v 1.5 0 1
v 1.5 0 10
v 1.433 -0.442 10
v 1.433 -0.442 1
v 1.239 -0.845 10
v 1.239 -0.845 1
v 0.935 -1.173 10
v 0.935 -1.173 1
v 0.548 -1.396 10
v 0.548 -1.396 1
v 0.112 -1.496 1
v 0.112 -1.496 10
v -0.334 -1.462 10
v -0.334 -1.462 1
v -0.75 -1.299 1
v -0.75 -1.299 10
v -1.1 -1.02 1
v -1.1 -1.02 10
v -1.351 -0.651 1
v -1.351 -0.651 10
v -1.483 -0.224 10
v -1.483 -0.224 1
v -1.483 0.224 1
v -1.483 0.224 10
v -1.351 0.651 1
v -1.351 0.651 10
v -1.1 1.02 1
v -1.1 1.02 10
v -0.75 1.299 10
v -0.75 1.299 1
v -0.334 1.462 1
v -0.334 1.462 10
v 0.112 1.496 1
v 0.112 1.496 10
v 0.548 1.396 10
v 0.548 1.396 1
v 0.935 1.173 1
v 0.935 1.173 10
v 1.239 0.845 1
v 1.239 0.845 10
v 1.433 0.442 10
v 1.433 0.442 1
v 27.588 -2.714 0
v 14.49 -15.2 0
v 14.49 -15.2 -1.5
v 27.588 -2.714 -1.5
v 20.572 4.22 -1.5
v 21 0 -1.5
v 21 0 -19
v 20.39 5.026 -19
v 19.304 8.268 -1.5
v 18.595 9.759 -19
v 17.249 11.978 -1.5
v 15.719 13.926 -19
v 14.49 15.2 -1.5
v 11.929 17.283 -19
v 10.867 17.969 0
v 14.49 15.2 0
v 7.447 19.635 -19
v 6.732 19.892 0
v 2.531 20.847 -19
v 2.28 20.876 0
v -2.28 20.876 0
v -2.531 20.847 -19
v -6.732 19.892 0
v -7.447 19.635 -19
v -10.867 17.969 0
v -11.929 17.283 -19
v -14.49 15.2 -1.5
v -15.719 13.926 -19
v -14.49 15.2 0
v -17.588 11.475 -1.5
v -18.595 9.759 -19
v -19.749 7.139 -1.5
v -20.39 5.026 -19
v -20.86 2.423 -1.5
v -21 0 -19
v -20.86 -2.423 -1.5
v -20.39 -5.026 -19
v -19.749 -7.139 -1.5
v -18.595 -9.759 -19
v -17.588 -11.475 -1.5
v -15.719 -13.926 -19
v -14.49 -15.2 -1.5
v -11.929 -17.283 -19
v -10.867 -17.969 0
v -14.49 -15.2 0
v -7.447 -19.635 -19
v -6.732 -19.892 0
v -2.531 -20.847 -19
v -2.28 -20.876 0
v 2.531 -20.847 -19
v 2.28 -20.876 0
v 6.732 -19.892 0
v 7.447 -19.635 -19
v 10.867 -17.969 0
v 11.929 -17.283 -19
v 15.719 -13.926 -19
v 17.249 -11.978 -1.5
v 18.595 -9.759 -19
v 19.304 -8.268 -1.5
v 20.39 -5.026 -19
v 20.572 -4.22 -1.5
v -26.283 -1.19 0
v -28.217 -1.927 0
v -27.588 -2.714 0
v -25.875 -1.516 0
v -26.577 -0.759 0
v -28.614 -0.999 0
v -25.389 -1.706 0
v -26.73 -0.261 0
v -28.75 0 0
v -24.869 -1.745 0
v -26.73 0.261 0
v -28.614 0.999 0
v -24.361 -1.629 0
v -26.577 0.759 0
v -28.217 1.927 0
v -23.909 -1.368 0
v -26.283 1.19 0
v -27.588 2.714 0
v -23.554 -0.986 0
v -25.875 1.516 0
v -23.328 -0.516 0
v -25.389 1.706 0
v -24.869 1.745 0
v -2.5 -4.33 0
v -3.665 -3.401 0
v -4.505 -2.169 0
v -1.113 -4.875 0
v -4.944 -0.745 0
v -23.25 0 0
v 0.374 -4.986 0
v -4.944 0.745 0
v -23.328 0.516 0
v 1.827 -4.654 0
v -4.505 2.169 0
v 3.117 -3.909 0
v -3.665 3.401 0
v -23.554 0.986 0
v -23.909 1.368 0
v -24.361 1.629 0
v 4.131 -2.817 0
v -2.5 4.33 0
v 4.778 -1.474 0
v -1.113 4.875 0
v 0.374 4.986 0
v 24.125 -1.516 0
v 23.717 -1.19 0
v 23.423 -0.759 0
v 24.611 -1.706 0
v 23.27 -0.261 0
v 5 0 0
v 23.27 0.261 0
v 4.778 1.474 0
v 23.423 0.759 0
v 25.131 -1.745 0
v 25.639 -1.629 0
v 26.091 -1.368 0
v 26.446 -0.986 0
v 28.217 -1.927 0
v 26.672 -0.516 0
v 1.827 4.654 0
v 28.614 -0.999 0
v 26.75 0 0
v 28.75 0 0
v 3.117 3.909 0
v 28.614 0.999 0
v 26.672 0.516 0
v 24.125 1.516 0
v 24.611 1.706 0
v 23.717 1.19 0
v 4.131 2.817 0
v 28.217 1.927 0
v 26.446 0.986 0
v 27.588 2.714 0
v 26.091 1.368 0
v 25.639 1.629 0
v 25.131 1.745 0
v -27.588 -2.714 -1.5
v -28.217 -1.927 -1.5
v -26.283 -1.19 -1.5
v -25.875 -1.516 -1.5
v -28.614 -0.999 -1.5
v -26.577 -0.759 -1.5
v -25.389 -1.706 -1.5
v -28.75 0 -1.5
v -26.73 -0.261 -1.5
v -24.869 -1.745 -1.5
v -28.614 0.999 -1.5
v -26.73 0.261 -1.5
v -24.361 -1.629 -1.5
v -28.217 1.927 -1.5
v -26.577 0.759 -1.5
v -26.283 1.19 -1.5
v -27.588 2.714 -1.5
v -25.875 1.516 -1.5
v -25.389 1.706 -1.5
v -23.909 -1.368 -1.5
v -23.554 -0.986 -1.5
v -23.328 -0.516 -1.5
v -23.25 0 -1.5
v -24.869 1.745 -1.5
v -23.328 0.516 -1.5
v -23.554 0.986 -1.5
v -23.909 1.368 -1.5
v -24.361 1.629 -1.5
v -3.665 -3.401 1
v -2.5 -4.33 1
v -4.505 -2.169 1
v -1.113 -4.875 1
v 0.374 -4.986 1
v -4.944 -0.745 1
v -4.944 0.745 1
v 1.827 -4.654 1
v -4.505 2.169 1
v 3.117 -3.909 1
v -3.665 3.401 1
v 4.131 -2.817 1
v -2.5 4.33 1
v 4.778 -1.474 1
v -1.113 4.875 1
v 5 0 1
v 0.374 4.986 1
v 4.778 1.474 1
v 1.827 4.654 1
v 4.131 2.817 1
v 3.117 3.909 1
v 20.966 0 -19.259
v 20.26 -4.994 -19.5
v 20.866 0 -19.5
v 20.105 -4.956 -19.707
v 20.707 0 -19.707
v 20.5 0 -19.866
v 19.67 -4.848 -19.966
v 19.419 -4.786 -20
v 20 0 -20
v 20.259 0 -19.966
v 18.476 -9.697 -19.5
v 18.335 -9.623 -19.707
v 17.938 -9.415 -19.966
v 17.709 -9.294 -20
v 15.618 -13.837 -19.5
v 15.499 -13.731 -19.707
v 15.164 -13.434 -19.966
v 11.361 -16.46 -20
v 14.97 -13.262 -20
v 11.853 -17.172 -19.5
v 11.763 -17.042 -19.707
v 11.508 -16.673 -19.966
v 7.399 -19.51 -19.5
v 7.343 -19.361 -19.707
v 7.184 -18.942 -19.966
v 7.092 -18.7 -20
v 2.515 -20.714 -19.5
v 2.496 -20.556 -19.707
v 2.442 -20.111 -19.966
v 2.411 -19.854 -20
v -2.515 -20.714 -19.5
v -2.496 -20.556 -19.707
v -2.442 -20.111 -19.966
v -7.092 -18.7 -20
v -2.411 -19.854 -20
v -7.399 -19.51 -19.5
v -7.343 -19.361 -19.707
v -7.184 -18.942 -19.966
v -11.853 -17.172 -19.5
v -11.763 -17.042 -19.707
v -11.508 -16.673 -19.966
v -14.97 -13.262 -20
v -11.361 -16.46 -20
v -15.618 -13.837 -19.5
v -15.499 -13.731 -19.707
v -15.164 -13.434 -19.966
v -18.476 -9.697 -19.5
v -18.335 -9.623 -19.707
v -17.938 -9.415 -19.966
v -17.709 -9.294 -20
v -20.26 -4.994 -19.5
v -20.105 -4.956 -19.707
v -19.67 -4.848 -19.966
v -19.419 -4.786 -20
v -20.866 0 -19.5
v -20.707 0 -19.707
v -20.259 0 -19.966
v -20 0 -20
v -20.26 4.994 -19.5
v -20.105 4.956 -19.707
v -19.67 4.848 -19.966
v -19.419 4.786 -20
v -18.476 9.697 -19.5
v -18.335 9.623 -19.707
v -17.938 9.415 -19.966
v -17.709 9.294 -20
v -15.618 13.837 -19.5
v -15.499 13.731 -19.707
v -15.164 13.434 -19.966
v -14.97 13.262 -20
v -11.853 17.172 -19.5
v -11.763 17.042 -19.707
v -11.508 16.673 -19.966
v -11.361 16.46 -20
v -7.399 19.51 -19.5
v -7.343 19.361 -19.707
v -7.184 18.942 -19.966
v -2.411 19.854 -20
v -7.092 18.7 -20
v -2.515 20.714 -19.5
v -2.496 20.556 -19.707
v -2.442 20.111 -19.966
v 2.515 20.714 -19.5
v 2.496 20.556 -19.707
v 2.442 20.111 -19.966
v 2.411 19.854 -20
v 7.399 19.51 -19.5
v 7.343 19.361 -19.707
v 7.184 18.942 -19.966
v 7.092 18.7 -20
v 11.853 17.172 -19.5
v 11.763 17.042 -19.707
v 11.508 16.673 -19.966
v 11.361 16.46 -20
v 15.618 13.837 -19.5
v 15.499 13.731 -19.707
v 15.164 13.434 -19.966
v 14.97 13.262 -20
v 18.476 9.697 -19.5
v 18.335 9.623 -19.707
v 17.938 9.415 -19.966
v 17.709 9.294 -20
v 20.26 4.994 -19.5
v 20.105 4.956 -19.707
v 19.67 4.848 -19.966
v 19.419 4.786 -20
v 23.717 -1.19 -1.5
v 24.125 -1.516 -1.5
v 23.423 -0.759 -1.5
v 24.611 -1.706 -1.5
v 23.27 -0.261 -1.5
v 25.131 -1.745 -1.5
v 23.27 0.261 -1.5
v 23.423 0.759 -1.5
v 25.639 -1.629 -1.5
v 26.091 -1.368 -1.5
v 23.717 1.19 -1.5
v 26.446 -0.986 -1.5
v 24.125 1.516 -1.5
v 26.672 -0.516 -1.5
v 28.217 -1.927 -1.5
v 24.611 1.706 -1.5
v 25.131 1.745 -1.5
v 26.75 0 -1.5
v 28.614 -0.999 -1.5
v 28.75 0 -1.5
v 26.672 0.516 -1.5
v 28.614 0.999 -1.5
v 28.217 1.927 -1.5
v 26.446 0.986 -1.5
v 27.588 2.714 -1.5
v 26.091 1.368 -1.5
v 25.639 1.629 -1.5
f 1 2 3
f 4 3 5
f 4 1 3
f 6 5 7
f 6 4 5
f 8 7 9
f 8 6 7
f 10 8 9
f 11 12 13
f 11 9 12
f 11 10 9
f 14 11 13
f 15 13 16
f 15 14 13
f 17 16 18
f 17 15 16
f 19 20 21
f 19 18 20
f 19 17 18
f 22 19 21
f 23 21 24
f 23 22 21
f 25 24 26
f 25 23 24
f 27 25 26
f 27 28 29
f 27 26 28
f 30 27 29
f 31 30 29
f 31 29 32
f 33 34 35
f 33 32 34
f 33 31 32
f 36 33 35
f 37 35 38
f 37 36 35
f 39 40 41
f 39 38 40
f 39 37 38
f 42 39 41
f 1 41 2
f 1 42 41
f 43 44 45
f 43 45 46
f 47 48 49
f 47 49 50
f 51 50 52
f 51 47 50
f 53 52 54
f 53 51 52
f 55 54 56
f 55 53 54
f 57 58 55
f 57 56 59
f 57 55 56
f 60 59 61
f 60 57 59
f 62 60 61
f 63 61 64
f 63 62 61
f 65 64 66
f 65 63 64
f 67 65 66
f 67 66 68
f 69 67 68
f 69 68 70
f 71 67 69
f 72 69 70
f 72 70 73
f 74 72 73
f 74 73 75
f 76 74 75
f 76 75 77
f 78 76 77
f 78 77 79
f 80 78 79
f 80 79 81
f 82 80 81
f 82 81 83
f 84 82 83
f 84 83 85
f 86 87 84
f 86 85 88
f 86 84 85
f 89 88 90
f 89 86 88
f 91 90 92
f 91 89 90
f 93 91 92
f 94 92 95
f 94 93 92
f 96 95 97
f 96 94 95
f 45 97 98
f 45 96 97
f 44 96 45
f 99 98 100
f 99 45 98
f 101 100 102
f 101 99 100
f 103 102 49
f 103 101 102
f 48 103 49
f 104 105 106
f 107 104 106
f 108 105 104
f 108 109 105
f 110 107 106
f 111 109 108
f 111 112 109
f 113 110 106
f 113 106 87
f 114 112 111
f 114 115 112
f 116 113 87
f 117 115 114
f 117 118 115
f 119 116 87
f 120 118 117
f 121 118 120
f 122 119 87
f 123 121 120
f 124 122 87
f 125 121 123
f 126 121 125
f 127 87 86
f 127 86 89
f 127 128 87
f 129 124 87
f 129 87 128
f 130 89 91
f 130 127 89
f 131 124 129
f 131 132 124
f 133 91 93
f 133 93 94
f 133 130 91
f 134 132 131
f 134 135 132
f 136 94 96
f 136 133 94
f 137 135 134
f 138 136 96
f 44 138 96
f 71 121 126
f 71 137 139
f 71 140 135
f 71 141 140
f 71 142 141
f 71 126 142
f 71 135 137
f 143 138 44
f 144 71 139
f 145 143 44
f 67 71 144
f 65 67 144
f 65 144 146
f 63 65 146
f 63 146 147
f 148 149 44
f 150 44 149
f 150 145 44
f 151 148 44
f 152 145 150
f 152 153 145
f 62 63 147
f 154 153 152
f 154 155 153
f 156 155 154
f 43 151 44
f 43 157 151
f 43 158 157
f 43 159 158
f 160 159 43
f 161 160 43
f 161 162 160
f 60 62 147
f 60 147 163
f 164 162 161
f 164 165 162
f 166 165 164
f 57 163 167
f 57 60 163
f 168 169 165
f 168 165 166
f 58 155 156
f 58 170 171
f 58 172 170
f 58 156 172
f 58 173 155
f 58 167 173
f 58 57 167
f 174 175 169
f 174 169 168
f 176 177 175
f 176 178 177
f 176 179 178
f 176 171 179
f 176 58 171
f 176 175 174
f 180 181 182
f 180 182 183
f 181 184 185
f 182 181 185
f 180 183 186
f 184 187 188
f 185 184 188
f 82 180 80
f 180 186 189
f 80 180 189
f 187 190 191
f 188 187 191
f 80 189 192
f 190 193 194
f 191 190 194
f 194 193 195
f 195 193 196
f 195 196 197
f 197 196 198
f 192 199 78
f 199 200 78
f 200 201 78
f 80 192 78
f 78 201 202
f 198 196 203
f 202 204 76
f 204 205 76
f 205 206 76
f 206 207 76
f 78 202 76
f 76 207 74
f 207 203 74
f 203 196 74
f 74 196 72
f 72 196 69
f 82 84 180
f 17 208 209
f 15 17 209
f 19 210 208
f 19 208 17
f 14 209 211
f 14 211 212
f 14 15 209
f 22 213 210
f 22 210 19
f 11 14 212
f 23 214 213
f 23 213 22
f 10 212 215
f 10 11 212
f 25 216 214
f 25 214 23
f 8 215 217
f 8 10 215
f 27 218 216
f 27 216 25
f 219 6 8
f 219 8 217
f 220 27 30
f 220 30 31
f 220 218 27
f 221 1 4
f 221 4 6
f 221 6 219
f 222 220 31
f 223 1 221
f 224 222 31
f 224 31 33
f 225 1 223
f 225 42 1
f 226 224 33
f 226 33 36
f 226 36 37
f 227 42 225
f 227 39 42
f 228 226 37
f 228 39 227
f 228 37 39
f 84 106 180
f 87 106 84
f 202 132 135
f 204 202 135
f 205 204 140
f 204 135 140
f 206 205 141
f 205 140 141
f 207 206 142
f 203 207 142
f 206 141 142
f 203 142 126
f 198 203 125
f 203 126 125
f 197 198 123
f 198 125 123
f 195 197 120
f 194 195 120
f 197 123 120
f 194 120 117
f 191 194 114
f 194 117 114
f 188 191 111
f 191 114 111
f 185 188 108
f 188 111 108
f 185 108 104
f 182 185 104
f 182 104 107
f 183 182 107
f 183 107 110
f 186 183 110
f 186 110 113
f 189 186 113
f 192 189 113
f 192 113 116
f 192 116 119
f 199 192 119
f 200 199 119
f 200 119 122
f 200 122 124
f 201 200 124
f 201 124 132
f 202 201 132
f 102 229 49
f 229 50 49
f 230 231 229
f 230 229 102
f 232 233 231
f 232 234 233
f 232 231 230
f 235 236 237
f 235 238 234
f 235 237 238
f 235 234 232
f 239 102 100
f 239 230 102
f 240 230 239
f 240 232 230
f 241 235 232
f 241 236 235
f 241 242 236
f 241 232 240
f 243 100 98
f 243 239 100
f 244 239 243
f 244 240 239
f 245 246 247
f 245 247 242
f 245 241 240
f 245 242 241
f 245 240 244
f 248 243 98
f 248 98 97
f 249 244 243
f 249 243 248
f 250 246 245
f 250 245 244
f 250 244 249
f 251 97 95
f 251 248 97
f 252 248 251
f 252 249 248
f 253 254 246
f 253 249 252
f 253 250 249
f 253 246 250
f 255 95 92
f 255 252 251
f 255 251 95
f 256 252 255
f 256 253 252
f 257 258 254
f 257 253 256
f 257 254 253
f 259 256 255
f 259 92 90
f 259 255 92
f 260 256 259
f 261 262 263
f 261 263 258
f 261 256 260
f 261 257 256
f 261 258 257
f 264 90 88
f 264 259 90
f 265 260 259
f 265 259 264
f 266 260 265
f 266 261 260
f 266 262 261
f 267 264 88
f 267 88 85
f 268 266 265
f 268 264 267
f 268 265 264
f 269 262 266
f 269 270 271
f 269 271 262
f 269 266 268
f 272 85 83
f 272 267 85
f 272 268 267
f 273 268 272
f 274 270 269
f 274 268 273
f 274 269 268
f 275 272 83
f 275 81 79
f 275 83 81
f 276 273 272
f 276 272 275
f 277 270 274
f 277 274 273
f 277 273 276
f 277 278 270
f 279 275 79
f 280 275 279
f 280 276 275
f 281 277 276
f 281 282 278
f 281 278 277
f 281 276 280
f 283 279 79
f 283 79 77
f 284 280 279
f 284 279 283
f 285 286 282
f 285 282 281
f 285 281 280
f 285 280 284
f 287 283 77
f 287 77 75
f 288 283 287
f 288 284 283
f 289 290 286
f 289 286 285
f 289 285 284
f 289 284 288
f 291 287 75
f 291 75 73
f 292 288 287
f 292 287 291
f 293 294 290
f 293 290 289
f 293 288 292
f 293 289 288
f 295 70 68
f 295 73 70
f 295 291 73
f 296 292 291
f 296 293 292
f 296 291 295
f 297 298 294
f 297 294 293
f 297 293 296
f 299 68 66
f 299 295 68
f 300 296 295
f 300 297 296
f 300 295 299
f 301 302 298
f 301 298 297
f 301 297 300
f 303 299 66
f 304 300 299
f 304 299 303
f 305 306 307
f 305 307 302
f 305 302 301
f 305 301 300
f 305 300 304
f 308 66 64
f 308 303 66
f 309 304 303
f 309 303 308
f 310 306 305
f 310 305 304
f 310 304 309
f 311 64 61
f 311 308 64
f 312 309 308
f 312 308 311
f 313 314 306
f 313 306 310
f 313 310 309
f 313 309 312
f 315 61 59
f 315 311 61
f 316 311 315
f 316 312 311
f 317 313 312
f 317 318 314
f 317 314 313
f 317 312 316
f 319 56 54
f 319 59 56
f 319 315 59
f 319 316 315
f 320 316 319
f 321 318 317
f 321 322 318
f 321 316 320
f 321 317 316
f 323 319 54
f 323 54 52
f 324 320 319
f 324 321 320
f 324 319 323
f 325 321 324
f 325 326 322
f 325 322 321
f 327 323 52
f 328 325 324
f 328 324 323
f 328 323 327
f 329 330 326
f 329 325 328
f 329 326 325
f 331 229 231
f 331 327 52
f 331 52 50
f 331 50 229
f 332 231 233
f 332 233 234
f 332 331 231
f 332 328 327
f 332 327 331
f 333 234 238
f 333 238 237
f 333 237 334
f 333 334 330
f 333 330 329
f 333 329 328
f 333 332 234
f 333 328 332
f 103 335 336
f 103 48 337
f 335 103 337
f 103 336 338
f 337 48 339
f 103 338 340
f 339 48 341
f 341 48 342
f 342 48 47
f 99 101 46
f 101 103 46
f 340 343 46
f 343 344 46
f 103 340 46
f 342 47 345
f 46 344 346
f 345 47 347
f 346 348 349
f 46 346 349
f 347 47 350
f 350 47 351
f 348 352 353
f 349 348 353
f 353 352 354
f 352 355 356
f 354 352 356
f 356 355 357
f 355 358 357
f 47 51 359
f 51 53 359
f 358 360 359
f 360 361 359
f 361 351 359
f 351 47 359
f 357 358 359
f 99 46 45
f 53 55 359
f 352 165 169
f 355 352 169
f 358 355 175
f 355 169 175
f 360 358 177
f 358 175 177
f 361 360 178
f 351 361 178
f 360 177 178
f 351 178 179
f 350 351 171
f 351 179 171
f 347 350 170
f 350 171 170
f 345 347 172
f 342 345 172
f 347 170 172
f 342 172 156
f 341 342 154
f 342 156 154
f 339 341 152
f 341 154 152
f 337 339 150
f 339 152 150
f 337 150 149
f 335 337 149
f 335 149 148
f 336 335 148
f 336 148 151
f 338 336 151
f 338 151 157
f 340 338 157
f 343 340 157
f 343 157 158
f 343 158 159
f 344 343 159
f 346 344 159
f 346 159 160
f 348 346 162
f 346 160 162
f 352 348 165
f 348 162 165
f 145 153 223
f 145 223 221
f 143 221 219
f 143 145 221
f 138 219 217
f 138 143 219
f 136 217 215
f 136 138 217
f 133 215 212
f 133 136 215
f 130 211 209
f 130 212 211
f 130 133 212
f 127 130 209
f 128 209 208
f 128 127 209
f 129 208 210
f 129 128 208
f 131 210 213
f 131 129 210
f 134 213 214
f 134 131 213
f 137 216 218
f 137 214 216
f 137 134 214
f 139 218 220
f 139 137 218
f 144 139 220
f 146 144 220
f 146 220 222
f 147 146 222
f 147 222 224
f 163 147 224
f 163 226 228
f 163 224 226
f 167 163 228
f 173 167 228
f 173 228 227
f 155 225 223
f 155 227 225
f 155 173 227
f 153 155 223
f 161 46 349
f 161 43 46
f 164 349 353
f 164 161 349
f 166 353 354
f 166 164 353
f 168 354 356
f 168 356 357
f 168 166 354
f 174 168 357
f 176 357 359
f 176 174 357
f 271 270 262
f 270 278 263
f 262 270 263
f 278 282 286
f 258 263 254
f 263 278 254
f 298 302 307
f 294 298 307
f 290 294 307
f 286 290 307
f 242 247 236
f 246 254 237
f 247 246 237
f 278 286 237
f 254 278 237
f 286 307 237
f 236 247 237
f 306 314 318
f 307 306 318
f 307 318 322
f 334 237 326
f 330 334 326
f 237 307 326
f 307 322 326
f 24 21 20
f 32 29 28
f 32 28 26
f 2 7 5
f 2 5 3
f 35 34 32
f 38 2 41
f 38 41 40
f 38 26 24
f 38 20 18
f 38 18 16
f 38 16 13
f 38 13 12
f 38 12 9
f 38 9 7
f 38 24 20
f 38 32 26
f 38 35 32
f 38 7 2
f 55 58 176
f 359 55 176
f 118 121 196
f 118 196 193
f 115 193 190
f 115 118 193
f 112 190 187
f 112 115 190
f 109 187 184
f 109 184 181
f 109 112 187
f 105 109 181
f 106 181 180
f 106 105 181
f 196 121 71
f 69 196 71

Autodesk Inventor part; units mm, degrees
ref_plane "YZ Plane" through (0, 0, 0) normal (1, 0, 0) x (0, 1, 0)
ref_plane "XZ Plane" through (0, 0, 0) normal (0, 1, 0) x (-1, 0, 0)
sketch "Skizze1" plane through (0, 0, 0) normal (0, 0, 1) x (1, 0, 0)
  circle A0 centre (0, 0) radius 21
  circle A1 centre (0, 0) radius 25 construction
  circle A2 centre (-25, 0) radius 1.75
  circle A3 centre (25, 0) radius 1.75
  arc A4 (-27.5875, 2.7143) -> (-27.5875, -2.7143) centre (-25, 0) ccw
  arc A5 (27.5875, -2.7143) -> (27.5875, 2.7143) centre (25, 0) ccw
  line L0 (-27.5875, 2.7143) -> (-14.49, 15.2)
  line L1 (-27.5875, -2.7143) -> (-14.49, -15.2)
  line L2 (14.49, -15.2) -> (27.5875, -2.7143)
  line L3 (14.49, 15.2) -> (27.5875, 2.7143)
  line L4 (-25, 0) -> (25, 0) construction
  circle A6 centre (0, 0) radius 1.5
  dimension "d0" = 42
  dimension "d1" = 3.5
  dimension "d2" = 50
  dimension "d3" = 2
  dimension "d8" = 3
extrude "Extrusion1" add sketch "Skizze1" against normal blind 1.5 contours A0 | A0 L3 A5 L2 | A0 L1 A4 L0 | A6
extrude "Extrusion2" add sketch "Skizze1" against normal blind 20 contours A0 | A6
extrude "Extrusion3" add sketch "Skizze1" along normal blind 10 contours A6
sketch "Skizze2" plane through (0, 0, 0) normal (0, 0, 1) x (1, 0, 0)
  circle A0 centre (0, 0) radius 5
  dimension "d11" = 10
extrude "Extrusion4" add sketch "Skizze2" along normal blind 1
ref_plane "Arbeitsebene1" through (0, 0, 0) normal (0, 0, 1) x (1, 0, 0)
fillet "Rundung1" radius 1 1 edges at (14.49, 15.2, -20)
sketch "Skizze3" plane through (0, 0, -20) normal (0, 0, -1) x (-1, 0, 0)
  circle A0 centre (0, 0) radius 21
  line L0 (-18.963, -9.0226) -> (-8.1058, -19.3726)
  line L1 (-8.1058, -19.3726) -> (-15.0058, -26.6106)
  line L2 (-15.0058, -26.6106) -> (-25.863, -16.2606)
  line L3 (-25.863, -16.2606) -> (-18.963, -9.0226)
  line L4 (0, 0) -> (-20.4344, -21.4356) construction
  circle A1 centre (0, 0) radius 21 construction
  arc A2 (-14.49, 15.2) -> (-14.49, -15.2) centre (0, 0) ccw construction
  line L5 (-14.49, 15.2) -> (-27.5875, 2.7143) construction
  arc A3 (-27.5875, 2.7143) -> (-27.5875, -2.7143) centre (-25, 0) ccw construction
  line L6 (-27.5875, -2.7143) -> (-14.49, -15.2) construction
  circle A4 centre (-25, 0) radius 1.75 construction
  point P0 (-13.5344, -14.1976)
  dimension "d15" = 15
  dimension "d16" = 10
properties part number "Stepper_42mm" material "Aluminium 6061"
